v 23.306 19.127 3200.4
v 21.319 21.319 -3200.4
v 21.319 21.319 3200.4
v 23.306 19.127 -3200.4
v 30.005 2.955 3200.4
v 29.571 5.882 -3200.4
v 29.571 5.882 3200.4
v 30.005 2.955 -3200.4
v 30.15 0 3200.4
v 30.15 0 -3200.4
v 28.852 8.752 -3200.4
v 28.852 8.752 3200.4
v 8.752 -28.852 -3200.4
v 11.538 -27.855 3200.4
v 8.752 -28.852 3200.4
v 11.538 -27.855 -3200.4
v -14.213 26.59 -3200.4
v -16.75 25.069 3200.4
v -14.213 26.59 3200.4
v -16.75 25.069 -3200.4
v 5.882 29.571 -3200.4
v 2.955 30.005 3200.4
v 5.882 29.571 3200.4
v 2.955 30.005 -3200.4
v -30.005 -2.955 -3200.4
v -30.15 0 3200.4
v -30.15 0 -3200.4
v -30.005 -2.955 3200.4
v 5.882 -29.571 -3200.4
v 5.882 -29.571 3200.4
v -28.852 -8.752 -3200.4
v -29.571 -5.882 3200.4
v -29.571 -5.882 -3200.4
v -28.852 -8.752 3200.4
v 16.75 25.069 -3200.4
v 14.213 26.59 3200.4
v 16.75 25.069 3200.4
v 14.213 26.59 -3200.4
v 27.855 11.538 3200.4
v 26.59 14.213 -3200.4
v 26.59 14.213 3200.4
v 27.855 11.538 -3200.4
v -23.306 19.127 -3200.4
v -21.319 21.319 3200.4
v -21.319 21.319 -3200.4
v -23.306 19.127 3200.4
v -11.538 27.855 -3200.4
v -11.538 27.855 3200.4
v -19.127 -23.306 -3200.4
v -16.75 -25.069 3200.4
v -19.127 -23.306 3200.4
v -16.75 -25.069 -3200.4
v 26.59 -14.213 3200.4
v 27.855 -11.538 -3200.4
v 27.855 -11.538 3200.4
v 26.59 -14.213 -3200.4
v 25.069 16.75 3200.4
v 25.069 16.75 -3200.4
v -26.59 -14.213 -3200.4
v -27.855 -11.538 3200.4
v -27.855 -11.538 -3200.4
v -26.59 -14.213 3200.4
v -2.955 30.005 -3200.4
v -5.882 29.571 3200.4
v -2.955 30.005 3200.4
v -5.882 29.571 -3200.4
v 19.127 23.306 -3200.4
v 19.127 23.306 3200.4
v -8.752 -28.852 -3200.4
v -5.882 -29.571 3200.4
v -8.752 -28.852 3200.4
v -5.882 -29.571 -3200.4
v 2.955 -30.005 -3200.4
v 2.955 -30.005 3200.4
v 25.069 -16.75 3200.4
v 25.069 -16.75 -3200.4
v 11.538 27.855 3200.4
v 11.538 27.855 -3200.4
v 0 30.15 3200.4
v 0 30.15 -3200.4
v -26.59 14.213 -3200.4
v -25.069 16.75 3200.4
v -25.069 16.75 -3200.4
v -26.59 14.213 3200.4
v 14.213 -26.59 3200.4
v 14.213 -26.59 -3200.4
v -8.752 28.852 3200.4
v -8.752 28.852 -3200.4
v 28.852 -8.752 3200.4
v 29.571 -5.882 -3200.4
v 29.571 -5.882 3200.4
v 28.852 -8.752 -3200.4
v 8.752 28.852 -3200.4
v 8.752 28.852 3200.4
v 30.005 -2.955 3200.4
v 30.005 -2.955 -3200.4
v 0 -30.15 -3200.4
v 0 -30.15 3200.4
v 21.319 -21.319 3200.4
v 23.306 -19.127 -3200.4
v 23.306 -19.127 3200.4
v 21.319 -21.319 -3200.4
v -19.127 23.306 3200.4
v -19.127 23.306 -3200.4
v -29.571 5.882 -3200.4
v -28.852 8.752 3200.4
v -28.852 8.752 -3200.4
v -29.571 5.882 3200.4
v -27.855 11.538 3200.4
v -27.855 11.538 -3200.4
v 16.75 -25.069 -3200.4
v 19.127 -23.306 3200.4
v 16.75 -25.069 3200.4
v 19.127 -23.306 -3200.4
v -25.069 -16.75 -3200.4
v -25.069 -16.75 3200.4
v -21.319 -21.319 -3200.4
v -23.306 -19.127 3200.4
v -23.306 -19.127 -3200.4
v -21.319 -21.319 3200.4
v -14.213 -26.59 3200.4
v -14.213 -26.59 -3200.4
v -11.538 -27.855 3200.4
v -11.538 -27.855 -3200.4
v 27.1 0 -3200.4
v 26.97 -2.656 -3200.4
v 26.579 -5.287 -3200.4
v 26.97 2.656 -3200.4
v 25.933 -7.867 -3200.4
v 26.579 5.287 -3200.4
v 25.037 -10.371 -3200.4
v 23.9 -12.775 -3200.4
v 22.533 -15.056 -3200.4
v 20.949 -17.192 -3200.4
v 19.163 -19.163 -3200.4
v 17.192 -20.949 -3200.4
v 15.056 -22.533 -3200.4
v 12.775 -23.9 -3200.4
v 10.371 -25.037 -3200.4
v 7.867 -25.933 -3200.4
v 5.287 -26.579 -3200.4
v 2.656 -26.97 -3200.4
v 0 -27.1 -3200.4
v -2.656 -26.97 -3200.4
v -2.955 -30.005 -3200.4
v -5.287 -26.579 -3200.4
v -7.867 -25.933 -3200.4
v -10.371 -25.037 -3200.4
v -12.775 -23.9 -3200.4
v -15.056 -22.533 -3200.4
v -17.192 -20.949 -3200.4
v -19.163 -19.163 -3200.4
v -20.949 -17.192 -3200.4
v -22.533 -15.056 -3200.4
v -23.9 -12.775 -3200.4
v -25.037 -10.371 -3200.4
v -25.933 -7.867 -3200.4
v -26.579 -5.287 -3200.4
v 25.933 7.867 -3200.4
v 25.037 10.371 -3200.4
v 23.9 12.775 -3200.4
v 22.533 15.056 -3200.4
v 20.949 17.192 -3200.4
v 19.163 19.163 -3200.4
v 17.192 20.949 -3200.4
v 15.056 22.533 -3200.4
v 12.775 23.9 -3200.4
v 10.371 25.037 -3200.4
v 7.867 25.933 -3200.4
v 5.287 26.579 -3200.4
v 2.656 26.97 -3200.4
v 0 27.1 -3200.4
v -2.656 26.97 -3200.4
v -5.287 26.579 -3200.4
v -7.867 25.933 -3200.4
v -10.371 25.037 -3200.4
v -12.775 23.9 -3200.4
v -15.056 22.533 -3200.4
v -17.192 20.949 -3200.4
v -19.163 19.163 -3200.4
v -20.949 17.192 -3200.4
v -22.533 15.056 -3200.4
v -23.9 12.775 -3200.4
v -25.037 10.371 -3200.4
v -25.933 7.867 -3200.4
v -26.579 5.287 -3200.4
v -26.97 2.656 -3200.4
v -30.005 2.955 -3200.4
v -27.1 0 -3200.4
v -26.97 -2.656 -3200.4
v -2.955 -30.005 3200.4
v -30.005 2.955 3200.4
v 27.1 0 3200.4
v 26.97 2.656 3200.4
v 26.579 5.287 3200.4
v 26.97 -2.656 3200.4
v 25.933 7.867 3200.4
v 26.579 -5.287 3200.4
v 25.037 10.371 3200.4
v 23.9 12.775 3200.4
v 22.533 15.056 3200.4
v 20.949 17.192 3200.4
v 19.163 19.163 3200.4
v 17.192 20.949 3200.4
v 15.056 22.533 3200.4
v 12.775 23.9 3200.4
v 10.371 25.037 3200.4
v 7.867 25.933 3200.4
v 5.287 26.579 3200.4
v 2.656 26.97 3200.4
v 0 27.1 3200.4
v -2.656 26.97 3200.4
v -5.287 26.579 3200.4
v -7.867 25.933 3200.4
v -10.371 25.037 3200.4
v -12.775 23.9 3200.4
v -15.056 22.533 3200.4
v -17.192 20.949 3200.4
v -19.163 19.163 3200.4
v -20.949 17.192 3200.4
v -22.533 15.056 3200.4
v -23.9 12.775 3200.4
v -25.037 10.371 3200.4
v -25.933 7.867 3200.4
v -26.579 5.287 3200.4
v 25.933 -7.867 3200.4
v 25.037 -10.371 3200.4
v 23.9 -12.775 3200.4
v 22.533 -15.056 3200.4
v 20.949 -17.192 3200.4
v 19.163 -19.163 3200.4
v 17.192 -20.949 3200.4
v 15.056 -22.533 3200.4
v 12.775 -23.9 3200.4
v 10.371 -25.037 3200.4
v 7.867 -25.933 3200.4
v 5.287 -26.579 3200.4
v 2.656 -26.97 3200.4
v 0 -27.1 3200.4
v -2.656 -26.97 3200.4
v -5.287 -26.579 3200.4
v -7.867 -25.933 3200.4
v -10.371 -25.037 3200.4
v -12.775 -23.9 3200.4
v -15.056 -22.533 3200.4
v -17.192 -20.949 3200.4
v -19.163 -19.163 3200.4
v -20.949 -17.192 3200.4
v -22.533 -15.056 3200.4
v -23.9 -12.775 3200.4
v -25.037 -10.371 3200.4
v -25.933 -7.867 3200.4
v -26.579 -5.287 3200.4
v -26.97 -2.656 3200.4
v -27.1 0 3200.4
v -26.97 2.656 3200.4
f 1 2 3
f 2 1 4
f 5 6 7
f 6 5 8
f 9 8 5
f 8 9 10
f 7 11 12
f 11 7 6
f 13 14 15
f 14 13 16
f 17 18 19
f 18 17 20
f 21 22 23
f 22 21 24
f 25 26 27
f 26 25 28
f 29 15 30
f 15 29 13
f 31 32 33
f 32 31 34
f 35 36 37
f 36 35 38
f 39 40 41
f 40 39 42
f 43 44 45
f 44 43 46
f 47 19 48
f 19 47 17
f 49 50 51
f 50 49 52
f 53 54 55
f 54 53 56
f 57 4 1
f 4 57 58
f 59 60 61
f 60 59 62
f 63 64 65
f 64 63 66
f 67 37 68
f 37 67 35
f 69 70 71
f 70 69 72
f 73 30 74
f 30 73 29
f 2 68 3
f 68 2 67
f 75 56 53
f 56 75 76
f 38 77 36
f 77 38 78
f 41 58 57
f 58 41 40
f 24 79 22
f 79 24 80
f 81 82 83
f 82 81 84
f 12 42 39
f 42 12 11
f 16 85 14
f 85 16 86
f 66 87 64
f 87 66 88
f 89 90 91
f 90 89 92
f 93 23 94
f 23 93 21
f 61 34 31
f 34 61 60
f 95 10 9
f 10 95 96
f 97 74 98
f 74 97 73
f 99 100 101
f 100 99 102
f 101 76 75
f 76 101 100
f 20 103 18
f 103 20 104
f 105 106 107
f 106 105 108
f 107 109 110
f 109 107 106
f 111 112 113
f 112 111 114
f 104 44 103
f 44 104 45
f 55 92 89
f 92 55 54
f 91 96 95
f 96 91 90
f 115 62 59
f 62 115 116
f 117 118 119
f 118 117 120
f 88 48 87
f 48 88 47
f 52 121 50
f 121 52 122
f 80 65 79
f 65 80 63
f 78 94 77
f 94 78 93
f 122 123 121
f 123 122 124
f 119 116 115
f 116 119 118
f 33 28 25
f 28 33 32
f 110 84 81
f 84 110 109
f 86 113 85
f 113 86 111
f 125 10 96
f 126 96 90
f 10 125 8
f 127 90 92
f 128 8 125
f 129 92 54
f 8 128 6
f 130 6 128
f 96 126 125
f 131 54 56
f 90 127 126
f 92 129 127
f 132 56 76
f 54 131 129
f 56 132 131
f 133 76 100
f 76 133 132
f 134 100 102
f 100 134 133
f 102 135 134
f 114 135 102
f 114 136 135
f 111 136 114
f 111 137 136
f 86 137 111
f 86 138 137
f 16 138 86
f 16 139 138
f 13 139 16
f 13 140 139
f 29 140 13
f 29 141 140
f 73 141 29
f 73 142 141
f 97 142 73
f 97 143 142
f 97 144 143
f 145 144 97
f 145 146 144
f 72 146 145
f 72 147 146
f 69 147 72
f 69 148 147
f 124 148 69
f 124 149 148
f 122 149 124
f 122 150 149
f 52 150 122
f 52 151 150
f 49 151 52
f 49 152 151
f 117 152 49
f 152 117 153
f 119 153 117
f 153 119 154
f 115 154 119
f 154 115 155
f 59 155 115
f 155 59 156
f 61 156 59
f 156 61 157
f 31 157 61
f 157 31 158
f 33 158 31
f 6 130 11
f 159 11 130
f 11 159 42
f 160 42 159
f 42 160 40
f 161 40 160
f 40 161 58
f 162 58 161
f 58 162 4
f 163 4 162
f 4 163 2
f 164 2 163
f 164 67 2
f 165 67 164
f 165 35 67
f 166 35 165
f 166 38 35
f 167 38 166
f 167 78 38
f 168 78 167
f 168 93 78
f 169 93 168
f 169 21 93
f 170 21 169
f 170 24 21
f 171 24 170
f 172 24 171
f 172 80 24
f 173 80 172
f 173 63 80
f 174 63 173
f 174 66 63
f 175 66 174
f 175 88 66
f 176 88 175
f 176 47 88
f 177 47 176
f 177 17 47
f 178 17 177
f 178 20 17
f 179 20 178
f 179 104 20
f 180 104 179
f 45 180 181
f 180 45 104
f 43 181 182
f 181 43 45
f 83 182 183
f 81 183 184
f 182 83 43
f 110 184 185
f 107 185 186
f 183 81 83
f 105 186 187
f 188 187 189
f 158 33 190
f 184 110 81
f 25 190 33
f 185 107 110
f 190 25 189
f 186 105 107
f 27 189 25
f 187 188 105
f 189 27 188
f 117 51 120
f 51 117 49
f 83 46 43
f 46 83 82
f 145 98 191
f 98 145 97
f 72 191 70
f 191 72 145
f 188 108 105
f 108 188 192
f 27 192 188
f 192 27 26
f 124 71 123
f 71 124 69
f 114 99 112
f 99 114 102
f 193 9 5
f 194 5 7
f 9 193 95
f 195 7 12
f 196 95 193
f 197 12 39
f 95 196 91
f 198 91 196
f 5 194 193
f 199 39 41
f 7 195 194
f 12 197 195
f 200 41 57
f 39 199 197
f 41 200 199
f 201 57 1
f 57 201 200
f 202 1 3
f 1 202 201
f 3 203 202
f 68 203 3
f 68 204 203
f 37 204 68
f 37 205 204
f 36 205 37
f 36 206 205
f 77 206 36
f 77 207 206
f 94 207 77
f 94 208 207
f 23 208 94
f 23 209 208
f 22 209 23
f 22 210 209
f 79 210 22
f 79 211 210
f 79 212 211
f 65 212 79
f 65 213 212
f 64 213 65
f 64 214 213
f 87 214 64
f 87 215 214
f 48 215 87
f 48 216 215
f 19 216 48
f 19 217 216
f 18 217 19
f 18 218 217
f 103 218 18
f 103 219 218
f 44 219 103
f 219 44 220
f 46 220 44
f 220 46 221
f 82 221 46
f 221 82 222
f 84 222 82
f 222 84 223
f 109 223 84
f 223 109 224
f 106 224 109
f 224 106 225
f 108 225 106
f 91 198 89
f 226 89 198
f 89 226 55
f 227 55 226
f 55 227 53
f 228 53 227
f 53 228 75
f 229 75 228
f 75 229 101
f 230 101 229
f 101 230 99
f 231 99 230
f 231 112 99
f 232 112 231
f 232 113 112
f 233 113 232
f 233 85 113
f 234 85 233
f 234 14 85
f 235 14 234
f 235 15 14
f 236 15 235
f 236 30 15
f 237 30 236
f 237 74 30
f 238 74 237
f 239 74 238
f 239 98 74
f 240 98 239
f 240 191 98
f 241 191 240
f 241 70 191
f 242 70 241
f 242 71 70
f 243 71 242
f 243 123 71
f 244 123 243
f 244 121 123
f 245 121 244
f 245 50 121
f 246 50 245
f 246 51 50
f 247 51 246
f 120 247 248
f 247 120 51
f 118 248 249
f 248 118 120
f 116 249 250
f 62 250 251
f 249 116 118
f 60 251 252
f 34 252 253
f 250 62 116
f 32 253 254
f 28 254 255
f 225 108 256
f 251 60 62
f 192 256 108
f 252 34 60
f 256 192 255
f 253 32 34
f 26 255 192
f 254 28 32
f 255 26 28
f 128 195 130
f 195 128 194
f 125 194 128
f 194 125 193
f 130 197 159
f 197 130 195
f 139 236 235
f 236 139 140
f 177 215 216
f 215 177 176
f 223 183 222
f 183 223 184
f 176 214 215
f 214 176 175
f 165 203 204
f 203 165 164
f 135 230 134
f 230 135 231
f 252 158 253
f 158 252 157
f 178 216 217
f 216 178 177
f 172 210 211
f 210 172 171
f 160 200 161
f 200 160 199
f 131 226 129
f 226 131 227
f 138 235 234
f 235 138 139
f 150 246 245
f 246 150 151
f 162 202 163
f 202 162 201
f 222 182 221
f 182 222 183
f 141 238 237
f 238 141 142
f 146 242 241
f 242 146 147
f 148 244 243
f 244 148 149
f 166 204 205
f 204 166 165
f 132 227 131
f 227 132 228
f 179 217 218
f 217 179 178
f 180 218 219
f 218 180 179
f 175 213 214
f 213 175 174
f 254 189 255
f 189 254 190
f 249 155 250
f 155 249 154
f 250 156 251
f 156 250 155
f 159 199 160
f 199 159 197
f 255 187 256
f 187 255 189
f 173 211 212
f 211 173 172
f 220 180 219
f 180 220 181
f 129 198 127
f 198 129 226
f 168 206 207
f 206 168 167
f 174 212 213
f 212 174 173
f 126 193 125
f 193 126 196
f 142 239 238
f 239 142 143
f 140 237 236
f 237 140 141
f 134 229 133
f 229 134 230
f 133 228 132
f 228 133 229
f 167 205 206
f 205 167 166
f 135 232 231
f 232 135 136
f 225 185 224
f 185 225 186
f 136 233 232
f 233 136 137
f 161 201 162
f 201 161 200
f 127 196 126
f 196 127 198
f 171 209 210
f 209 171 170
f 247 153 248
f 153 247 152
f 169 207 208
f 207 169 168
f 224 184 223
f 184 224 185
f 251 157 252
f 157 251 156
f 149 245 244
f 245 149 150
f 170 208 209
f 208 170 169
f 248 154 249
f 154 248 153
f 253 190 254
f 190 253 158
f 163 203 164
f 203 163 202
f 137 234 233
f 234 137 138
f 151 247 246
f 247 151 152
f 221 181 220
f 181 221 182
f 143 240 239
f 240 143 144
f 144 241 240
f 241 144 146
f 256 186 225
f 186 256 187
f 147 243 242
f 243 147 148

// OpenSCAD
// Auto-generated by scripts/author_from_manifest.py (Phase D.3).
// Source: data/phase_d_manifest.json (sku_intent='wheatland-sch10-black-2in-21ft').
// Do not hand-edit — regenerate from the manifest.
//
// @part wheatland_sch10_black_2in_21ft
// @kind pipe_segment
// @category pipe.sch10.black.steel
// @display-name "Sch10 Black Steel 2\" x 21ft"
// @mfg wheatland_tube
// @price-usd 22.00
// @install-minutes 4
// @crew journeyman
// @param size_in number default=2 label="Size" unit="in"
// @port inlet position=[0,0,-0.5] direction=[0,0,-1] style=grooved size_in=2 role=run_a
// @port outlet position=[0,0,0.5] direction=[0,0,1] style=grooved size_in=2 role=run_b

size_in  = 2.0;
length_m = 6.4008;
schedule = "sch10";

function od_mm(nps) =
    nps ==  0.75 ? 26.7 :
    nps ==   1  ? 33.4 :
    nps == 1.25 ? 42.2 :
    nps == 1.5  ? 48.3 :
    nps ==   2  ? 60.3 :
    nps == 2.5  ? 73.0 :
    nps ==   3  ? 88.9 :
    nps ==   4  ? 114.3 :
    nps ==   5  ? 141.3 :
    nps ==   6  ? 168.3 :
    nps ==   8  ? 219.1 :
    nps ==  10  ? 273.0 : 60.3;

function wall_mm(nps, sched) =
    sched == "sch40"
        ? (nps <= 1.5 ? 3.68 : nps <= 3 ? 5.49 : 6.02)
        : (nps <= 1.5 ? 2.77 : nps <= 3 ? 3.05 : 3.68);

od = od_mm(size_in);
id = od - 2 * wall_mm(size_in, schedule);
len_mm = length_m * 1000;

difference() {
    cylinder(h = len_mm, d = od, center = true, $fn = 64);
    cylinder(h = len_mm + 1, d = id, center = true, $fn = 64);
}
